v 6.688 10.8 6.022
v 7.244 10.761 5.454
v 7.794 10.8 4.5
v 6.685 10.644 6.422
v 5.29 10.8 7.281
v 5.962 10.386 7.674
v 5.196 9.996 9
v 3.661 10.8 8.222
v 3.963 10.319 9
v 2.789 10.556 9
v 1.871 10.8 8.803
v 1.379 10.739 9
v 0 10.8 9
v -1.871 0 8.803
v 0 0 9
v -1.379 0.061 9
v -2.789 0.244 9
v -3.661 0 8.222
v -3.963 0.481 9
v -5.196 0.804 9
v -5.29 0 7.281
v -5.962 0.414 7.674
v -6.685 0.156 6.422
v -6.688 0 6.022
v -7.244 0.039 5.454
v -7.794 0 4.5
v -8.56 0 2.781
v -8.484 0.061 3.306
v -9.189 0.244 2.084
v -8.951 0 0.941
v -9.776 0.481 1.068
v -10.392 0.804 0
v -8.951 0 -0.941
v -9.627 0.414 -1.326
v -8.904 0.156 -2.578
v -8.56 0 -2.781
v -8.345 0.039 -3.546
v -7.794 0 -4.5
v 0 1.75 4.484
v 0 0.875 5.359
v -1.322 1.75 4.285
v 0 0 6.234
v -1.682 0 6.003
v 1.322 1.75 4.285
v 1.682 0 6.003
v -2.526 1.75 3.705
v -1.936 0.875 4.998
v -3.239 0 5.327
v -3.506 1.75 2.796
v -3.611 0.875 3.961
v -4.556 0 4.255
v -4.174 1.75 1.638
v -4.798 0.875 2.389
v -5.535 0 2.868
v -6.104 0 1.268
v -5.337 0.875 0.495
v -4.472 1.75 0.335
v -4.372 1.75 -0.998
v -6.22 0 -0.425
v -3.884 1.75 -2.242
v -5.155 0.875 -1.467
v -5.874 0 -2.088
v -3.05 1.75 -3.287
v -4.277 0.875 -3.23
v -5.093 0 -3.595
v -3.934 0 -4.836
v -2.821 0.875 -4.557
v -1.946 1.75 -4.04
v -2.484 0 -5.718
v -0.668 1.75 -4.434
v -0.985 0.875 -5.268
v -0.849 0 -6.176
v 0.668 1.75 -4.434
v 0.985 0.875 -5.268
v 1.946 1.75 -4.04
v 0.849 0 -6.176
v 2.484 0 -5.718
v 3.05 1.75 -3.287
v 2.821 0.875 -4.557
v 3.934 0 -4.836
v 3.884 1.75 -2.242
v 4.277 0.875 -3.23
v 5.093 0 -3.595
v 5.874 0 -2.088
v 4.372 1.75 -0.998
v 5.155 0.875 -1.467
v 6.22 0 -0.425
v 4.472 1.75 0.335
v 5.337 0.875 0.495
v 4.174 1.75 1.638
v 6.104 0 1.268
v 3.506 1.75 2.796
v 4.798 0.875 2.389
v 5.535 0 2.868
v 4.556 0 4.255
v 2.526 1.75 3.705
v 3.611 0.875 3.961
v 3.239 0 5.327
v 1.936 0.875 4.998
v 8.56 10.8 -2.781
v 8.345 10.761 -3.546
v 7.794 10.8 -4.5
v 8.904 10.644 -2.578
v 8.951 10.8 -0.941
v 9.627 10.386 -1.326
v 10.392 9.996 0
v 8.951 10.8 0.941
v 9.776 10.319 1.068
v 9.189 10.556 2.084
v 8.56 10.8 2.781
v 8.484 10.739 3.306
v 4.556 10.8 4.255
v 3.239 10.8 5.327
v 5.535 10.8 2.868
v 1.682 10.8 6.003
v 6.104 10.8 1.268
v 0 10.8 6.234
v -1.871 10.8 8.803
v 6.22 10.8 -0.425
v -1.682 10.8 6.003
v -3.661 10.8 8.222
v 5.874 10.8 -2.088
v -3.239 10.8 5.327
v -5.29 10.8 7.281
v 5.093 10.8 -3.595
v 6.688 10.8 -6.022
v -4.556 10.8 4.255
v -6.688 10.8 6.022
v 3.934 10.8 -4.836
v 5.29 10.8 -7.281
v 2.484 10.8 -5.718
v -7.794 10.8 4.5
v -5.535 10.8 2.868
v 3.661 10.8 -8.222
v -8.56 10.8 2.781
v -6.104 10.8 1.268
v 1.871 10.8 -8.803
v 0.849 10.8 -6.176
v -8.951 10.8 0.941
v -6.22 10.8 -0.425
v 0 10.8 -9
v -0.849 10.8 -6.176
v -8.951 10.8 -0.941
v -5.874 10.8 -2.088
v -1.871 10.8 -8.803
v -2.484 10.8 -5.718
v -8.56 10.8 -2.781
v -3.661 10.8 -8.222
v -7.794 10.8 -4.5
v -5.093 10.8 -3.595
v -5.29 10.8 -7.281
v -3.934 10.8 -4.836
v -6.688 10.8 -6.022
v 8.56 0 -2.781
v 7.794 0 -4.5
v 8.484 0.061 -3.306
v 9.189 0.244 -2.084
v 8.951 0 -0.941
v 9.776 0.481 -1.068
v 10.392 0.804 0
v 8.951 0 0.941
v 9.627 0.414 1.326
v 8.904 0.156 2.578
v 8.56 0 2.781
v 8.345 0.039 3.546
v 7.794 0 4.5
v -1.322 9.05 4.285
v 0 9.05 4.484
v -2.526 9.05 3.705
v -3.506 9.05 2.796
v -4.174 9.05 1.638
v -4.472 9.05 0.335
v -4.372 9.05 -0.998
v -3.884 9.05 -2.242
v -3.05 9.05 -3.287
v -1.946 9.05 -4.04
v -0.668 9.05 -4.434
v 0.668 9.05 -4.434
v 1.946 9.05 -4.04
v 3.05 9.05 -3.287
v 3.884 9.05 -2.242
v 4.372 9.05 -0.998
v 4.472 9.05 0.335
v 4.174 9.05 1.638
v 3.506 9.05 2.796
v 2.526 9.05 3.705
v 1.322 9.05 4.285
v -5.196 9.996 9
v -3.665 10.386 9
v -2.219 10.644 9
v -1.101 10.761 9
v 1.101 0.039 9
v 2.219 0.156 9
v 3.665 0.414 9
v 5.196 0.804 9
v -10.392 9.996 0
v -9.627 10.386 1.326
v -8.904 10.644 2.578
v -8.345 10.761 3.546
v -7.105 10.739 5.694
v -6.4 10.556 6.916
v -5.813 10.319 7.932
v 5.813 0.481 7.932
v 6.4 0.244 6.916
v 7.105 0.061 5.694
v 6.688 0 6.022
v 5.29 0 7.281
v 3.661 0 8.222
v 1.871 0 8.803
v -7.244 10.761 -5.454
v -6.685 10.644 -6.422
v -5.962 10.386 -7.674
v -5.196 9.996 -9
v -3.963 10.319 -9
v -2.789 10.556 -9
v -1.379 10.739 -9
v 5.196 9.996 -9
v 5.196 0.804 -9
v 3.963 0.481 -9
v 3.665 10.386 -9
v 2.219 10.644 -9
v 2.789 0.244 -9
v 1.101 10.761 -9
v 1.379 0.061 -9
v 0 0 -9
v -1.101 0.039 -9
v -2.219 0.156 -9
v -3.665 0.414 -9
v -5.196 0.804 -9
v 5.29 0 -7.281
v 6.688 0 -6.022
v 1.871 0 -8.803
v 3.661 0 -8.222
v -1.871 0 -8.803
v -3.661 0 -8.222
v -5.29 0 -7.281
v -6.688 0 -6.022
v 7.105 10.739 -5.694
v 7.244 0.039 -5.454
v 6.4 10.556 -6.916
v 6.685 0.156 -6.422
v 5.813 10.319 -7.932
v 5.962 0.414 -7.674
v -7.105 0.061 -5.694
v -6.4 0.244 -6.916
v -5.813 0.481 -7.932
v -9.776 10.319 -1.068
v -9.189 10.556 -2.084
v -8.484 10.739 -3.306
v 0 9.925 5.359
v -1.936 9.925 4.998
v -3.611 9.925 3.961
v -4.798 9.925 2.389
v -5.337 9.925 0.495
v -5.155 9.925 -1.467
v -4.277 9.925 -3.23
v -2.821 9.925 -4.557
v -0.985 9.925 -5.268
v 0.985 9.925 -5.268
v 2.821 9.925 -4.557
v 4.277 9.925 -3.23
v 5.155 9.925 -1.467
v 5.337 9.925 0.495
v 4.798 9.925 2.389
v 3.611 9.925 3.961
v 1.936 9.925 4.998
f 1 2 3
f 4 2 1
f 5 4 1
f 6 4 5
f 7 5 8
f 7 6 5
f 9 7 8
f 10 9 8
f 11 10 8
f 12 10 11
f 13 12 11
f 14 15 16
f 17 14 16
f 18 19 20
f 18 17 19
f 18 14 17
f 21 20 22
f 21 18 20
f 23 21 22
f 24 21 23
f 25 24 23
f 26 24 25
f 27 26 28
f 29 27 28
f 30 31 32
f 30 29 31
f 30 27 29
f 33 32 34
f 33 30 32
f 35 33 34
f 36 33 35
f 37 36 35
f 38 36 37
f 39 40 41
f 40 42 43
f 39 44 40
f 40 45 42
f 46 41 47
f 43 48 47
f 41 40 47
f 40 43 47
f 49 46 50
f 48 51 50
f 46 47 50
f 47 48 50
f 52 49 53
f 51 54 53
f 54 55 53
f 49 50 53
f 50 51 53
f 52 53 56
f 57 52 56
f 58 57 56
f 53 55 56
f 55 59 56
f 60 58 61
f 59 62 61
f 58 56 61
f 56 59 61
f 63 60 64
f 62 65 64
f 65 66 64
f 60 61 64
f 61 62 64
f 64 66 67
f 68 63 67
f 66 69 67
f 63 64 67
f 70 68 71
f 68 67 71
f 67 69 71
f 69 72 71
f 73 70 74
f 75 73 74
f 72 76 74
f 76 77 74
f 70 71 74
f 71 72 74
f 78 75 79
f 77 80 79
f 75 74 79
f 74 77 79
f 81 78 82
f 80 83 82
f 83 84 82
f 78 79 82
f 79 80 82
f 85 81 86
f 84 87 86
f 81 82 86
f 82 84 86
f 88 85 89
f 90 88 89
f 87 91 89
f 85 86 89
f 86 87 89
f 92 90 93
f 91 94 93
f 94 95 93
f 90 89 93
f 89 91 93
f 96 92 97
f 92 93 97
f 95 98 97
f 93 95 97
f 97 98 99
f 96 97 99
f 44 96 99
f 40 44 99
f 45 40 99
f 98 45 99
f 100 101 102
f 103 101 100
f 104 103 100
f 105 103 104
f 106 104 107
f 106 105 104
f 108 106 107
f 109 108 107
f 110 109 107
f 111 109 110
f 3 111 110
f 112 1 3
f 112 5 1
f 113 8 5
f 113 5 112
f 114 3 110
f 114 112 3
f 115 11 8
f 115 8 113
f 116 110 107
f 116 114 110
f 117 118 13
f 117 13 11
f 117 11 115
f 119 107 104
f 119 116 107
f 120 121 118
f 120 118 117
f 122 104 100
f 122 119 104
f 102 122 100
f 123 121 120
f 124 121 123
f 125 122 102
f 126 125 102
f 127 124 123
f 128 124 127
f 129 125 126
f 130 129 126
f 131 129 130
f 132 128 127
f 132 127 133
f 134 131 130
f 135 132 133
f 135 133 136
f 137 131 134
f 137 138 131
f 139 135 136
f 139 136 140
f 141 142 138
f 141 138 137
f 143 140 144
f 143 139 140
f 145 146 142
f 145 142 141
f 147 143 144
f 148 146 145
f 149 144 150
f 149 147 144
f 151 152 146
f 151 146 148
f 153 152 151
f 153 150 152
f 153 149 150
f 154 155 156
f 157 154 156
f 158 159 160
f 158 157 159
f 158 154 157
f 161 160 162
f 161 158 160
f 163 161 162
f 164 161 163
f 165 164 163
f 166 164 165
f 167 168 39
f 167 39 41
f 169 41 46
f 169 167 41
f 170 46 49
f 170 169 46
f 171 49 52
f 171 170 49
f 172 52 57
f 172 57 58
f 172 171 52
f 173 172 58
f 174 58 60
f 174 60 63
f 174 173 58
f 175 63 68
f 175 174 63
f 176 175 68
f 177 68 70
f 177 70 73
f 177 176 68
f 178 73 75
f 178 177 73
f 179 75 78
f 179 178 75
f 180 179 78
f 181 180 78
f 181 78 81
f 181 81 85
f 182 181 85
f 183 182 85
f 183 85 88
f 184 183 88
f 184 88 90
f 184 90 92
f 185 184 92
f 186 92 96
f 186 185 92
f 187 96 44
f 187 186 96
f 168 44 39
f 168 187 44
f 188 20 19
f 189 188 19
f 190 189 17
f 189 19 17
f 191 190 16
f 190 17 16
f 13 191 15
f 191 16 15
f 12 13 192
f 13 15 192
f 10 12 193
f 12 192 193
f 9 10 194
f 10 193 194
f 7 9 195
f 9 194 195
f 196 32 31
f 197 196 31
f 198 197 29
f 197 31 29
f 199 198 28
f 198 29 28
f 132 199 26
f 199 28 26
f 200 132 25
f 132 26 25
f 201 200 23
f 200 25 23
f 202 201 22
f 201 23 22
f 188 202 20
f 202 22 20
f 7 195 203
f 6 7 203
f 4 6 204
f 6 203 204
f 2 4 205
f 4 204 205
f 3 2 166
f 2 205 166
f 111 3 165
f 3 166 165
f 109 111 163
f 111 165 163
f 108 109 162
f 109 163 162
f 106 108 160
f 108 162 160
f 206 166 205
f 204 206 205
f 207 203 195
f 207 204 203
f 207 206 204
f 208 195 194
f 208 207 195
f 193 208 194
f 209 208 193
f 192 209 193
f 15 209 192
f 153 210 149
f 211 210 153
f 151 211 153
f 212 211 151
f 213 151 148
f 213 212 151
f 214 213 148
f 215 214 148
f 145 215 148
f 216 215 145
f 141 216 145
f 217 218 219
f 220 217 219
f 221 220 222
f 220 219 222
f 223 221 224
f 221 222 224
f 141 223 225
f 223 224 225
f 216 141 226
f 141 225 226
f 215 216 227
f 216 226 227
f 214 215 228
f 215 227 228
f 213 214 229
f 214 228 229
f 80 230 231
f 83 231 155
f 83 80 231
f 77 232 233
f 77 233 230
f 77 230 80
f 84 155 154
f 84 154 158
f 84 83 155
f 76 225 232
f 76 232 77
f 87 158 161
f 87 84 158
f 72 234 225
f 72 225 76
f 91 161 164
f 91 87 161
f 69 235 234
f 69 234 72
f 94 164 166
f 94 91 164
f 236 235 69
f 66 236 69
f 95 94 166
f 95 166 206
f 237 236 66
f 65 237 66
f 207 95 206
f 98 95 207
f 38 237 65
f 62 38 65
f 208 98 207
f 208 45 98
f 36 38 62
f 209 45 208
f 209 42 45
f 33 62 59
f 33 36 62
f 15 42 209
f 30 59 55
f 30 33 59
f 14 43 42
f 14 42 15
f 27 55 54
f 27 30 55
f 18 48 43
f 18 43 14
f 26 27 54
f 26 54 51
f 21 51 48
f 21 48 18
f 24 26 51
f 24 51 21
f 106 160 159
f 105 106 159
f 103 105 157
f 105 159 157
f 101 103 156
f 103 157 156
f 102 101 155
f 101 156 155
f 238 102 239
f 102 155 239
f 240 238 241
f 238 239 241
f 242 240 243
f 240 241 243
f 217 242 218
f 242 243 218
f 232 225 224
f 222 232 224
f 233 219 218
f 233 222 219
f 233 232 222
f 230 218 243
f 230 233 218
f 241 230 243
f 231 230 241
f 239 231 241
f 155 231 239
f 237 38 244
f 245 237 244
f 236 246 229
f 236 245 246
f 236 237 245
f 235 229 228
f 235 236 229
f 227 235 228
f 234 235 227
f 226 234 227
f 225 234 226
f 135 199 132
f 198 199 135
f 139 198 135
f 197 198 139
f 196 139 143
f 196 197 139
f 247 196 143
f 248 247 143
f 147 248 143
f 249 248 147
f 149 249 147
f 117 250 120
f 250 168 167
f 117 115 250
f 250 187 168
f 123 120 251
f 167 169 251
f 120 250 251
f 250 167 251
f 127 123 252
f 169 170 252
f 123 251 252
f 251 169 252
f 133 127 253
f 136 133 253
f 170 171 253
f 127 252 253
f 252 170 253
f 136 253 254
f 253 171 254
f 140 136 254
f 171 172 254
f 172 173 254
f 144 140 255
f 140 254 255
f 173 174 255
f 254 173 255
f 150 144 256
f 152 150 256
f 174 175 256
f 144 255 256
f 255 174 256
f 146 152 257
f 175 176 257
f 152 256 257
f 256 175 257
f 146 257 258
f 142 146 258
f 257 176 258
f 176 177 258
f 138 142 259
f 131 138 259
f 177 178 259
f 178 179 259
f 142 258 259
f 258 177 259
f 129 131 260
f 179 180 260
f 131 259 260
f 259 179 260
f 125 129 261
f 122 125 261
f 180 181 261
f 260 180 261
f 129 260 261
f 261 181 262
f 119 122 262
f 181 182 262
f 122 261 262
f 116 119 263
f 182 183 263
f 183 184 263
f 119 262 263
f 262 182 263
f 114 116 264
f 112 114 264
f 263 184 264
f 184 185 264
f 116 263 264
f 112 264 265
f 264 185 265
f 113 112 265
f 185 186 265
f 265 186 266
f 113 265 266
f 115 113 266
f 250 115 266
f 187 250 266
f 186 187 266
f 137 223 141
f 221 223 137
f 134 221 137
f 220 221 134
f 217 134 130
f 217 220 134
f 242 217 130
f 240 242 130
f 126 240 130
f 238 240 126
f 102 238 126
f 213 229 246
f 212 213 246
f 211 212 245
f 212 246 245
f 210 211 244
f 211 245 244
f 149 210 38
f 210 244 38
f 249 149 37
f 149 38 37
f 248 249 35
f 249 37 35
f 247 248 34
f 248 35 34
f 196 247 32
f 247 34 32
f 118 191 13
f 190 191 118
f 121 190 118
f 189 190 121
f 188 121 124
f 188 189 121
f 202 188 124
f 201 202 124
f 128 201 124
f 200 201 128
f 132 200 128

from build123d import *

# Parameters (mm, degrees)
ESQUISSE2_OUTSIDE_W     = 34.974
ESQUISSE2_OUTSIDE_H     = 34.974
ENL_V_MAT_EXTRU_1_DEPTH = 10.8
CHANFREIN_SIZE          = 1.75


with BuildPart() as part:
    # Esquisse1 → Base-Révolution (revolve)
    with BuildSketch(Plane.XY):
        Polygon((4.484455543, 10.8), (9, 10.8), (12.727922061, 8.647683156), (12.727922061, 2.152316844), (9, 0), (4.484455543, 0), align=None)
    revolve(axis=Axis((0, 2.4, 0), (0, -1, 0)))

    # Esquisse2 outside → Enlèv. mat.-Extru.1 (cut)
    with BuildSketch(Plane(origin=(0, 0, 0), x_dir=(1, 0, 0), z_dir=(0, 1, 0))):
        Rectangle(ESQUISSE2_OUTSIDE_W, ESQUISSE2_OUTSIDE_H)
        Polygon((-5.196152423, -9), (5.196152423, -9), (10.392304845, 0), (5.196152423, 9), (-5.196152423, 9), (-10.392304845, 0), align=None, mode=Mode.SUBTRACT)
    extrude(amount=ENL_V_MAT_EXTRU_1_DEPTH, mode=Mode.SUBTRACT)

    # Chanfrein
    chanfrein_edges = [part.edges().sort_by_distance(p)[0] for p in [
        (-4.484455543, 10.8, 0),
        (-4.484455543, 0, 0),
    ]]
    chamfer(chanfrein_edges, length=CHANFREIN_SIZE)


solid = part.part
